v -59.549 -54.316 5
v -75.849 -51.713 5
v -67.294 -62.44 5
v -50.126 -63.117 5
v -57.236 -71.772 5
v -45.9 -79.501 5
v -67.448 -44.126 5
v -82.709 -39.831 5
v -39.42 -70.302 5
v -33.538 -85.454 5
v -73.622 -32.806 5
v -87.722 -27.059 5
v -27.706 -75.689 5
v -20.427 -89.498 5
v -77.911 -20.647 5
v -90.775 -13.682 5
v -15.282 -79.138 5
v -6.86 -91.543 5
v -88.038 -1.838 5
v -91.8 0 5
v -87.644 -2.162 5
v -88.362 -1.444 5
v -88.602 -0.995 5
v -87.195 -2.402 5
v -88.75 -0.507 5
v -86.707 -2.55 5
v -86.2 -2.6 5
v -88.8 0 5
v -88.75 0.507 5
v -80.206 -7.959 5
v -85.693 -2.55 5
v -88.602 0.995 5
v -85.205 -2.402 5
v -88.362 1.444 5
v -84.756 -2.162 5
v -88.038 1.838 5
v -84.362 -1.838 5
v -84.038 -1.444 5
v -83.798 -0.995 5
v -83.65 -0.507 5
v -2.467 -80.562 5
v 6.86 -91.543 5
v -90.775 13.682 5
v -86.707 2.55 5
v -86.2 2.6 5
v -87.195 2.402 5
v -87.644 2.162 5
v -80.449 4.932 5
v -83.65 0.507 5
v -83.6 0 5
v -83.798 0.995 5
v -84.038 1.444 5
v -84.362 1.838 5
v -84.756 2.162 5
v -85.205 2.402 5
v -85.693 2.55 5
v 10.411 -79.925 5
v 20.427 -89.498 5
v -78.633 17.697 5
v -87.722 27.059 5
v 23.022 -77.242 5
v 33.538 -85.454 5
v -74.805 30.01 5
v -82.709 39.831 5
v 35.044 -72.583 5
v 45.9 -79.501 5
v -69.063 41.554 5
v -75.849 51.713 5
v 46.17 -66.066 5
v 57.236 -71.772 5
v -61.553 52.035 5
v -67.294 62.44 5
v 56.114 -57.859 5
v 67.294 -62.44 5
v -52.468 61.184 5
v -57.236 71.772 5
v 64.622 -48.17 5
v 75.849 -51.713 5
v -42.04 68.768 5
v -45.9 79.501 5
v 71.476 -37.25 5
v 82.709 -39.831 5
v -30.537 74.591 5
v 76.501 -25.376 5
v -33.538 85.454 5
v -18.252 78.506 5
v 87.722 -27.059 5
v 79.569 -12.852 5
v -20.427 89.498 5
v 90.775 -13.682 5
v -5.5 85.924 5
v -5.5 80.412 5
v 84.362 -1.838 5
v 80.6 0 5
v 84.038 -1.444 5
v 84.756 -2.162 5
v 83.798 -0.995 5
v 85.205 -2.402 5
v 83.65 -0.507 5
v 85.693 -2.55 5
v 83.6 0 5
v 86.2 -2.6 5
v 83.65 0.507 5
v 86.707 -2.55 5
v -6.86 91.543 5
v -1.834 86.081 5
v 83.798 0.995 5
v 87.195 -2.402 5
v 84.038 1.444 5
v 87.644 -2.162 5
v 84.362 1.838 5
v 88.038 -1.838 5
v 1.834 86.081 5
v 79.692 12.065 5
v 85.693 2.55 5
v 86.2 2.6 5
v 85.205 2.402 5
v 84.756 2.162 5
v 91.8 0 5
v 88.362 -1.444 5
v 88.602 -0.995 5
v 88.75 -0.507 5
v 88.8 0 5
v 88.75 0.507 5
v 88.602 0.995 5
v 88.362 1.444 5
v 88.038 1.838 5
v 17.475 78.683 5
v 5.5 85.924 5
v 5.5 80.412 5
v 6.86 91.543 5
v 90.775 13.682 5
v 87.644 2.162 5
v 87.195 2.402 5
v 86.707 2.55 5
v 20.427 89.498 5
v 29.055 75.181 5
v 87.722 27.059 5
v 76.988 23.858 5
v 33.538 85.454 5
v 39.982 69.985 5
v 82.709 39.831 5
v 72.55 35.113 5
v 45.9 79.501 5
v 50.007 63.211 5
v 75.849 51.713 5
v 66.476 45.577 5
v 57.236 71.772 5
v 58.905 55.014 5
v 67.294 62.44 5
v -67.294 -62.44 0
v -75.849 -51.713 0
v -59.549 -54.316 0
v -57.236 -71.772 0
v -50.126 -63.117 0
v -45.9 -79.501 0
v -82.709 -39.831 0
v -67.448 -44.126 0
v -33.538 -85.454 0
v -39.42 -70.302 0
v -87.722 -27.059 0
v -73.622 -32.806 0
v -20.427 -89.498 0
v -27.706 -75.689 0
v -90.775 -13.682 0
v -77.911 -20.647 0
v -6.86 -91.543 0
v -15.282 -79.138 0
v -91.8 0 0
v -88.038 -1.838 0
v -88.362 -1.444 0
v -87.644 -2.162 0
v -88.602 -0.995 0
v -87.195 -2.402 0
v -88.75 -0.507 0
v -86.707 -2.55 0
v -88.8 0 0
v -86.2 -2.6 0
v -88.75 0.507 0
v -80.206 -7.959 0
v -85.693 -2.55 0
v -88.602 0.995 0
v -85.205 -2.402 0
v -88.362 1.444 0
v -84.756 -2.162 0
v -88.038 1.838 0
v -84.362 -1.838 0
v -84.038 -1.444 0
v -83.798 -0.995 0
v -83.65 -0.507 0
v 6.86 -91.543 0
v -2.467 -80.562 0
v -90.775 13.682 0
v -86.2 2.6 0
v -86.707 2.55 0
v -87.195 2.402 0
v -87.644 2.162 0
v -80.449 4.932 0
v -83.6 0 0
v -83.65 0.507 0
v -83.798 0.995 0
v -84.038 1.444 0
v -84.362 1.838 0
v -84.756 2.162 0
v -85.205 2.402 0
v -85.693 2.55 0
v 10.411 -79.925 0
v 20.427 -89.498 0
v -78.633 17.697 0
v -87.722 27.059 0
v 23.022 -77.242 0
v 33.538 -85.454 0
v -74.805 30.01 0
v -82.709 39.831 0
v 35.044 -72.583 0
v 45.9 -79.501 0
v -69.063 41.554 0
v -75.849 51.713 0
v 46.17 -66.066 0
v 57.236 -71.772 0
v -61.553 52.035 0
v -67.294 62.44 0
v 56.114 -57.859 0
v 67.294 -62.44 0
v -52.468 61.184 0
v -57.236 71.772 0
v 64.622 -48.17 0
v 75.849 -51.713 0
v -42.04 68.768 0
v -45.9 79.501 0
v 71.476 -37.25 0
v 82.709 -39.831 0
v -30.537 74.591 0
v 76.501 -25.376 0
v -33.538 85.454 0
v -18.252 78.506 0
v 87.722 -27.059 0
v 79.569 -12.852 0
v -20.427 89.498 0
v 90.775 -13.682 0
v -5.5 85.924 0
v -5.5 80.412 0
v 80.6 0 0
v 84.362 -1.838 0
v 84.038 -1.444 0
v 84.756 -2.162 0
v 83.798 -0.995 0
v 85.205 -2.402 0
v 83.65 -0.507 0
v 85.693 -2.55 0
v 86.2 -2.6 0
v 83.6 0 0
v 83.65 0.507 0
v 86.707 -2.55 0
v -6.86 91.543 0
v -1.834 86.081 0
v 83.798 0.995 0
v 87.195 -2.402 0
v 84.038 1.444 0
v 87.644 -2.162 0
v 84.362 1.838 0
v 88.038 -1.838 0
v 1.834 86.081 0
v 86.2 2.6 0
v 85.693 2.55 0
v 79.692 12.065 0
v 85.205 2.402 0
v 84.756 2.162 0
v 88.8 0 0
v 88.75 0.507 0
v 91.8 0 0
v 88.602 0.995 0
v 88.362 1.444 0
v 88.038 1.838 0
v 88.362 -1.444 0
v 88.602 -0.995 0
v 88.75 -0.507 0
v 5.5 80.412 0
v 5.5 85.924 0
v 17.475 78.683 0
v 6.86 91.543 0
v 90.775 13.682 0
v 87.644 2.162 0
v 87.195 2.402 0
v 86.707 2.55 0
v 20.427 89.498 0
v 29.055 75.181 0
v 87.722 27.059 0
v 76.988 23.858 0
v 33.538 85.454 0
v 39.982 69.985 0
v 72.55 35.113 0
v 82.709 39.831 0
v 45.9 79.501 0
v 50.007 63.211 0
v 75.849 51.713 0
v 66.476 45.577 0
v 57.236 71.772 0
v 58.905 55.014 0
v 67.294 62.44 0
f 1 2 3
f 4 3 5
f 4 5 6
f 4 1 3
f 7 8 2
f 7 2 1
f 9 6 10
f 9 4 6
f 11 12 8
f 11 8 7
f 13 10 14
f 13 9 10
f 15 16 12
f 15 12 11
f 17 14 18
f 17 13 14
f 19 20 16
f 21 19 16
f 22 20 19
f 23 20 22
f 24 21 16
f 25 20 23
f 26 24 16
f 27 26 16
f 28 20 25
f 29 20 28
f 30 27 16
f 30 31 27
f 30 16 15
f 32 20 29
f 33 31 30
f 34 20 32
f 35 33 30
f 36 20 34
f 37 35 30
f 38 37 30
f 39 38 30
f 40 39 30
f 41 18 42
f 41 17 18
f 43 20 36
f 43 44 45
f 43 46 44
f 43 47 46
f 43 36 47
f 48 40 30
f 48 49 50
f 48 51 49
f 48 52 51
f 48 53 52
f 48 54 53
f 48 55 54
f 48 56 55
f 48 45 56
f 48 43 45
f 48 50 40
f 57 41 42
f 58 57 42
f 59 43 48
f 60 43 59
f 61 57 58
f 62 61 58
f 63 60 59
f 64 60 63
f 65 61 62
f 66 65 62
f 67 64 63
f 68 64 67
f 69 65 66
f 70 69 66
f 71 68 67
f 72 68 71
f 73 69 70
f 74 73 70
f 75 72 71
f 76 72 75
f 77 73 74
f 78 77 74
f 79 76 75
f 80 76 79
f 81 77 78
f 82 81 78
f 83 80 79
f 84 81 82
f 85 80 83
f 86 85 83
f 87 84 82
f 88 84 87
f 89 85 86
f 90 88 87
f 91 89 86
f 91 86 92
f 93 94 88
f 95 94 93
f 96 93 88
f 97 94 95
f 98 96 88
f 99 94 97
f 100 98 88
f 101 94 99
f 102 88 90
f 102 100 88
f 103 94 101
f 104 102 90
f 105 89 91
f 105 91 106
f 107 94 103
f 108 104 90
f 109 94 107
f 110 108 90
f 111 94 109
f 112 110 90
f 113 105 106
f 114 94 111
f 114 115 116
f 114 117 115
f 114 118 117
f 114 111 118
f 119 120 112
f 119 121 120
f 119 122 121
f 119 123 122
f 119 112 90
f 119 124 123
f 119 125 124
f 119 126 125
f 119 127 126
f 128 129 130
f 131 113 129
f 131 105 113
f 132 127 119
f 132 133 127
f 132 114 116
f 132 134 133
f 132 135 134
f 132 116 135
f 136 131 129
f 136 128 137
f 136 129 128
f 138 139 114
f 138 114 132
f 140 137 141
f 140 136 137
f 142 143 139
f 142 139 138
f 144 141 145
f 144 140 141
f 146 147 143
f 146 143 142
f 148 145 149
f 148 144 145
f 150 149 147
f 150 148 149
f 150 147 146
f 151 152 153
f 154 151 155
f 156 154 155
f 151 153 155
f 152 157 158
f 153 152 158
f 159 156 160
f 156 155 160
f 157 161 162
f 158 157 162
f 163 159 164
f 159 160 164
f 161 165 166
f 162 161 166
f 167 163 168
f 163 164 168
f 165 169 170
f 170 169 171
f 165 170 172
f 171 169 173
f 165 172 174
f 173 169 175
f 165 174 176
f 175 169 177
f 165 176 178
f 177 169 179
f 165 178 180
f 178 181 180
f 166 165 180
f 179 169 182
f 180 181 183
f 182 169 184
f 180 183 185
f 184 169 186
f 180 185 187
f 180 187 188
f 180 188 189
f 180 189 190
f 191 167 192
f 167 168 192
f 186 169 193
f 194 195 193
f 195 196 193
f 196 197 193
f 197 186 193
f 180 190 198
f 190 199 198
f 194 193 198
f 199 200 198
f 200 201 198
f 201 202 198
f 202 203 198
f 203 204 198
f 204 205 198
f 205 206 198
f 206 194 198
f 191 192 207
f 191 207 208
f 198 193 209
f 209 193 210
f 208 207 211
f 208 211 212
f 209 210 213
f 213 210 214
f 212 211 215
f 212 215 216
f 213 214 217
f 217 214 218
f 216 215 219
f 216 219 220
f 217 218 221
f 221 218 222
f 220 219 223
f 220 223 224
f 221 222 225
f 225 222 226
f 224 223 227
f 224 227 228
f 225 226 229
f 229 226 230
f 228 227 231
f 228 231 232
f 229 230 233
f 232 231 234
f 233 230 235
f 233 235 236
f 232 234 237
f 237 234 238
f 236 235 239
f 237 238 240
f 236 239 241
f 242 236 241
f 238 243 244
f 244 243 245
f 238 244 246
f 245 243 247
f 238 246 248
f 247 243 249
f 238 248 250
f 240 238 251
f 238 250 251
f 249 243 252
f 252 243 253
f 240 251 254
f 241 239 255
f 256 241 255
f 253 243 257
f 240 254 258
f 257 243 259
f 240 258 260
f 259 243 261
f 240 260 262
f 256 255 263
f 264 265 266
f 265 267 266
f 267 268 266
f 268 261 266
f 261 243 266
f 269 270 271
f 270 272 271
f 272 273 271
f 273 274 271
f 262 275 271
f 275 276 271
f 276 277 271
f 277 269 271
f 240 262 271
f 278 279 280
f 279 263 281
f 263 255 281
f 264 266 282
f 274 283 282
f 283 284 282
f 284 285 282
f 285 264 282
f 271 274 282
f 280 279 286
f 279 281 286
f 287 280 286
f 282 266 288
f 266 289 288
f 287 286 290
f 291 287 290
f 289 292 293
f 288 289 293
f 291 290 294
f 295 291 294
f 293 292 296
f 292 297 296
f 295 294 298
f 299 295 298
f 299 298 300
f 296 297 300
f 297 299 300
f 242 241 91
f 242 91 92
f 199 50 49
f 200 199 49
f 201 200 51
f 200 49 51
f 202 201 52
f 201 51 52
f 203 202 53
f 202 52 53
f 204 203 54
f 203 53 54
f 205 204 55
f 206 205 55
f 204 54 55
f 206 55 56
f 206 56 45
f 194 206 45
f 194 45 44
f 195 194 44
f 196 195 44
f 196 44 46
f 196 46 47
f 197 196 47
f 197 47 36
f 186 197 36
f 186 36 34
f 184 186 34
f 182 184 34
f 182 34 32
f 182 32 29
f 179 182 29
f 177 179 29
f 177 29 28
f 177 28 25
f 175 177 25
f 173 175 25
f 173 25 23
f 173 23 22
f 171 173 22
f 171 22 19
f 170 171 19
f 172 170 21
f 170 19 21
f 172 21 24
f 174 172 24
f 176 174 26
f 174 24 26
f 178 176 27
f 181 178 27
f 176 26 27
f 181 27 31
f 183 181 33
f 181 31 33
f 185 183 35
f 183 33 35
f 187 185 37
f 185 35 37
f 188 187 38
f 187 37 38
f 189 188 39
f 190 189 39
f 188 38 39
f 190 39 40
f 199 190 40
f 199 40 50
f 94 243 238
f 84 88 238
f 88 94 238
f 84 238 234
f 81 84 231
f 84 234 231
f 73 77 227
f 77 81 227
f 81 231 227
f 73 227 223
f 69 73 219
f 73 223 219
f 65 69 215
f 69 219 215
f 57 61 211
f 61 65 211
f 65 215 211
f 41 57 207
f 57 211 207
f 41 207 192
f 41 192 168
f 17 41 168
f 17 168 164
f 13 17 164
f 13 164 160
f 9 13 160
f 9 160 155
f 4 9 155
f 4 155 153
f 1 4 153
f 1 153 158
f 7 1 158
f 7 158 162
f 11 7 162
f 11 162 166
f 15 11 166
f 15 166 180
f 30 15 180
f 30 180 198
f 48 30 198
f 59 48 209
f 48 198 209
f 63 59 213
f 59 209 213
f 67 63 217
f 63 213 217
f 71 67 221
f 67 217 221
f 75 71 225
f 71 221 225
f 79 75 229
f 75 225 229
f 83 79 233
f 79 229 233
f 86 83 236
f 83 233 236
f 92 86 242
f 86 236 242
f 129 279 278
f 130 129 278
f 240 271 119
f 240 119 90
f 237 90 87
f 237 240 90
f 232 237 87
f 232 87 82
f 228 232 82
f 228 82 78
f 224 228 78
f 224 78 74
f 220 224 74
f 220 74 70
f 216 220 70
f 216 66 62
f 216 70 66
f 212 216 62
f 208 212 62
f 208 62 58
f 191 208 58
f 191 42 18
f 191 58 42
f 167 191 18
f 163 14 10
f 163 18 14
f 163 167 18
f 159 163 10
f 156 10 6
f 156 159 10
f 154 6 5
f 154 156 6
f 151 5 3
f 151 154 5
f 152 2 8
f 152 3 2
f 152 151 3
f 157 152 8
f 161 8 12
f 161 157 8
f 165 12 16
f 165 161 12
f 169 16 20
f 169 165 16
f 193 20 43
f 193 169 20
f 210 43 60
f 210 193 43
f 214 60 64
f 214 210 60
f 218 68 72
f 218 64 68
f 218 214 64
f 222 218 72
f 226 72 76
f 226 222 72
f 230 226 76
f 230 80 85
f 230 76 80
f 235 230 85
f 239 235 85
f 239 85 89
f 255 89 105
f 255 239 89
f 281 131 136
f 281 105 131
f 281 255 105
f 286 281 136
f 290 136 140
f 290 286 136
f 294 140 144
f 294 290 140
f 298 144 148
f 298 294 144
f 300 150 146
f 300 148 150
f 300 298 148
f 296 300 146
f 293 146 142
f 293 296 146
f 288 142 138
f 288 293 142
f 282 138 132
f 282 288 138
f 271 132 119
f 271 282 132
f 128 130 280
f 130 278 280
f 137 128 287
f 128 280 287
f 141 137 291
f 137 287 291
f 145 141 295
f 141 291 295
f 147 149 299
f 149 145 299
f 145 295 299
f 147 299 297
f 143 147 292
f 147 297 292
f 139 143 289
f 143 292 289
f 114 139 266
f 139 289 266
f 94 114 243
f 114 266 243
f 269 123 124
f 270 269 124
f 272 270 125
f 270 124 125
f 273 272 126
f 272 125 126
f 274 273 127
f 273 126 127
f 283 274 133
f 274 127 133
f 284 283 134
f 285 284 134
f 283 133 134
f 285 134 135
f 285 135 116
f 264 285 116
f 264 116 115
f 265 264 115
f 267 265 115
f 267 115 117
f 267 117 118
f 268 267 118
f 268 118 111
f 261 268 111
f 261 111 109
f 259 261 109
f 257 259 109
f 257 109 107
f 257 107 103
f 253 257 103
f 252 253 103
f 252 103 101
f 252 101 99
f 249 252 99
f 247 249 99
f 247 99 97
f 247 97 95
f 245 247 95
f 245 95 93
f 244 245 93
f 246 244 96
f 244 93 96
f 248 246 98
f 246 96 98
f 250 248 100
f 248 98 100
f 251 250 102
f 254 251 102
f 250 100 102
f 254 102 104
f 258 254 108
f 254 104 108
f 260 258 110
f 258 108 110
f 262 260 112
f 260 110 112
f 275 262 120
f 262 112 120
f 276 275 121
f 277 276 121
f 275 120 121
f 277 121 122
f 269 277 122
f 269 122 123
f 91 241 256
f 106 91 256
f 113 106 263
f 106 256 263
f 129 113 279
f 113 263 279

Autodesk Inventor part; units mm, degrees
ref_plane "YZ Plane" through (0, 0, 0) normal (1, 0, 0) x (0, 1, 0)
ref_plane "XZ Plane" through (0, 0, 0) normal (0, 1, 0) x (-1, 0, 0)
ref_plane "XY Plane" through (0, 0, 0) normal (0, 0, 1) x (1, 0, 0)
sketch "Skizze1" plane through (0, 0, 0) normal (0, 0, 1) x (1, 0, 0)
  circle A0 centre (0, 0) radius 80.1 construction
  circle A1 centre (0, 0) radius 93.8 construction
  circle A2 centre (0, 0) radius 80.6
  circle A3 centre (0, 0) radius 91.8
  arc A4 (5.5, 85.9242) -> (-5.5, 85.9242) centre (0, 0) ccw
  line L0 (-5.5, 85.9242) -> (-5.5, 80.4121)
  line L1 (5.5, 85.9242) -> (5.5, 80.4121)
  point P0 (0, 86.1)
  dimension "d0" = 187.6
  dimension "d1" = 160.2
  dimension "d2" = 2
  dimension "d3" = 0.5
  dimension "d6" = 6
  dimension "d7" = 11
extrude "Extrusion1" add sketch "Skizze1" along normal blind 5
sketch "Skizze2" plane through (0, 0, 5) normal (0, 0, 1) x (1, 0, 0)
  circle A0 centre (-86.2, 0) radius 2.6
  circle A1 centre (86.2, 0) radius 2.6
  line L0 (-86.2, 0) -> (86.2, 0) construction
  arc A2 (-5.5, 80.4121) -> (5.5, 80.4121) centre (0, 0) ccw construction
  point P0 (-80.6, 0)
  point P1 (80.6, 0)
  dimension "d8" = 5.2
  dimension "d9" = 5.6
  dimension "d10" = 5.6
extrude "Extrusion2" cut sketch "Skizze2" against normal blind 5
properties part number "Montage_Ring_Vorne"
